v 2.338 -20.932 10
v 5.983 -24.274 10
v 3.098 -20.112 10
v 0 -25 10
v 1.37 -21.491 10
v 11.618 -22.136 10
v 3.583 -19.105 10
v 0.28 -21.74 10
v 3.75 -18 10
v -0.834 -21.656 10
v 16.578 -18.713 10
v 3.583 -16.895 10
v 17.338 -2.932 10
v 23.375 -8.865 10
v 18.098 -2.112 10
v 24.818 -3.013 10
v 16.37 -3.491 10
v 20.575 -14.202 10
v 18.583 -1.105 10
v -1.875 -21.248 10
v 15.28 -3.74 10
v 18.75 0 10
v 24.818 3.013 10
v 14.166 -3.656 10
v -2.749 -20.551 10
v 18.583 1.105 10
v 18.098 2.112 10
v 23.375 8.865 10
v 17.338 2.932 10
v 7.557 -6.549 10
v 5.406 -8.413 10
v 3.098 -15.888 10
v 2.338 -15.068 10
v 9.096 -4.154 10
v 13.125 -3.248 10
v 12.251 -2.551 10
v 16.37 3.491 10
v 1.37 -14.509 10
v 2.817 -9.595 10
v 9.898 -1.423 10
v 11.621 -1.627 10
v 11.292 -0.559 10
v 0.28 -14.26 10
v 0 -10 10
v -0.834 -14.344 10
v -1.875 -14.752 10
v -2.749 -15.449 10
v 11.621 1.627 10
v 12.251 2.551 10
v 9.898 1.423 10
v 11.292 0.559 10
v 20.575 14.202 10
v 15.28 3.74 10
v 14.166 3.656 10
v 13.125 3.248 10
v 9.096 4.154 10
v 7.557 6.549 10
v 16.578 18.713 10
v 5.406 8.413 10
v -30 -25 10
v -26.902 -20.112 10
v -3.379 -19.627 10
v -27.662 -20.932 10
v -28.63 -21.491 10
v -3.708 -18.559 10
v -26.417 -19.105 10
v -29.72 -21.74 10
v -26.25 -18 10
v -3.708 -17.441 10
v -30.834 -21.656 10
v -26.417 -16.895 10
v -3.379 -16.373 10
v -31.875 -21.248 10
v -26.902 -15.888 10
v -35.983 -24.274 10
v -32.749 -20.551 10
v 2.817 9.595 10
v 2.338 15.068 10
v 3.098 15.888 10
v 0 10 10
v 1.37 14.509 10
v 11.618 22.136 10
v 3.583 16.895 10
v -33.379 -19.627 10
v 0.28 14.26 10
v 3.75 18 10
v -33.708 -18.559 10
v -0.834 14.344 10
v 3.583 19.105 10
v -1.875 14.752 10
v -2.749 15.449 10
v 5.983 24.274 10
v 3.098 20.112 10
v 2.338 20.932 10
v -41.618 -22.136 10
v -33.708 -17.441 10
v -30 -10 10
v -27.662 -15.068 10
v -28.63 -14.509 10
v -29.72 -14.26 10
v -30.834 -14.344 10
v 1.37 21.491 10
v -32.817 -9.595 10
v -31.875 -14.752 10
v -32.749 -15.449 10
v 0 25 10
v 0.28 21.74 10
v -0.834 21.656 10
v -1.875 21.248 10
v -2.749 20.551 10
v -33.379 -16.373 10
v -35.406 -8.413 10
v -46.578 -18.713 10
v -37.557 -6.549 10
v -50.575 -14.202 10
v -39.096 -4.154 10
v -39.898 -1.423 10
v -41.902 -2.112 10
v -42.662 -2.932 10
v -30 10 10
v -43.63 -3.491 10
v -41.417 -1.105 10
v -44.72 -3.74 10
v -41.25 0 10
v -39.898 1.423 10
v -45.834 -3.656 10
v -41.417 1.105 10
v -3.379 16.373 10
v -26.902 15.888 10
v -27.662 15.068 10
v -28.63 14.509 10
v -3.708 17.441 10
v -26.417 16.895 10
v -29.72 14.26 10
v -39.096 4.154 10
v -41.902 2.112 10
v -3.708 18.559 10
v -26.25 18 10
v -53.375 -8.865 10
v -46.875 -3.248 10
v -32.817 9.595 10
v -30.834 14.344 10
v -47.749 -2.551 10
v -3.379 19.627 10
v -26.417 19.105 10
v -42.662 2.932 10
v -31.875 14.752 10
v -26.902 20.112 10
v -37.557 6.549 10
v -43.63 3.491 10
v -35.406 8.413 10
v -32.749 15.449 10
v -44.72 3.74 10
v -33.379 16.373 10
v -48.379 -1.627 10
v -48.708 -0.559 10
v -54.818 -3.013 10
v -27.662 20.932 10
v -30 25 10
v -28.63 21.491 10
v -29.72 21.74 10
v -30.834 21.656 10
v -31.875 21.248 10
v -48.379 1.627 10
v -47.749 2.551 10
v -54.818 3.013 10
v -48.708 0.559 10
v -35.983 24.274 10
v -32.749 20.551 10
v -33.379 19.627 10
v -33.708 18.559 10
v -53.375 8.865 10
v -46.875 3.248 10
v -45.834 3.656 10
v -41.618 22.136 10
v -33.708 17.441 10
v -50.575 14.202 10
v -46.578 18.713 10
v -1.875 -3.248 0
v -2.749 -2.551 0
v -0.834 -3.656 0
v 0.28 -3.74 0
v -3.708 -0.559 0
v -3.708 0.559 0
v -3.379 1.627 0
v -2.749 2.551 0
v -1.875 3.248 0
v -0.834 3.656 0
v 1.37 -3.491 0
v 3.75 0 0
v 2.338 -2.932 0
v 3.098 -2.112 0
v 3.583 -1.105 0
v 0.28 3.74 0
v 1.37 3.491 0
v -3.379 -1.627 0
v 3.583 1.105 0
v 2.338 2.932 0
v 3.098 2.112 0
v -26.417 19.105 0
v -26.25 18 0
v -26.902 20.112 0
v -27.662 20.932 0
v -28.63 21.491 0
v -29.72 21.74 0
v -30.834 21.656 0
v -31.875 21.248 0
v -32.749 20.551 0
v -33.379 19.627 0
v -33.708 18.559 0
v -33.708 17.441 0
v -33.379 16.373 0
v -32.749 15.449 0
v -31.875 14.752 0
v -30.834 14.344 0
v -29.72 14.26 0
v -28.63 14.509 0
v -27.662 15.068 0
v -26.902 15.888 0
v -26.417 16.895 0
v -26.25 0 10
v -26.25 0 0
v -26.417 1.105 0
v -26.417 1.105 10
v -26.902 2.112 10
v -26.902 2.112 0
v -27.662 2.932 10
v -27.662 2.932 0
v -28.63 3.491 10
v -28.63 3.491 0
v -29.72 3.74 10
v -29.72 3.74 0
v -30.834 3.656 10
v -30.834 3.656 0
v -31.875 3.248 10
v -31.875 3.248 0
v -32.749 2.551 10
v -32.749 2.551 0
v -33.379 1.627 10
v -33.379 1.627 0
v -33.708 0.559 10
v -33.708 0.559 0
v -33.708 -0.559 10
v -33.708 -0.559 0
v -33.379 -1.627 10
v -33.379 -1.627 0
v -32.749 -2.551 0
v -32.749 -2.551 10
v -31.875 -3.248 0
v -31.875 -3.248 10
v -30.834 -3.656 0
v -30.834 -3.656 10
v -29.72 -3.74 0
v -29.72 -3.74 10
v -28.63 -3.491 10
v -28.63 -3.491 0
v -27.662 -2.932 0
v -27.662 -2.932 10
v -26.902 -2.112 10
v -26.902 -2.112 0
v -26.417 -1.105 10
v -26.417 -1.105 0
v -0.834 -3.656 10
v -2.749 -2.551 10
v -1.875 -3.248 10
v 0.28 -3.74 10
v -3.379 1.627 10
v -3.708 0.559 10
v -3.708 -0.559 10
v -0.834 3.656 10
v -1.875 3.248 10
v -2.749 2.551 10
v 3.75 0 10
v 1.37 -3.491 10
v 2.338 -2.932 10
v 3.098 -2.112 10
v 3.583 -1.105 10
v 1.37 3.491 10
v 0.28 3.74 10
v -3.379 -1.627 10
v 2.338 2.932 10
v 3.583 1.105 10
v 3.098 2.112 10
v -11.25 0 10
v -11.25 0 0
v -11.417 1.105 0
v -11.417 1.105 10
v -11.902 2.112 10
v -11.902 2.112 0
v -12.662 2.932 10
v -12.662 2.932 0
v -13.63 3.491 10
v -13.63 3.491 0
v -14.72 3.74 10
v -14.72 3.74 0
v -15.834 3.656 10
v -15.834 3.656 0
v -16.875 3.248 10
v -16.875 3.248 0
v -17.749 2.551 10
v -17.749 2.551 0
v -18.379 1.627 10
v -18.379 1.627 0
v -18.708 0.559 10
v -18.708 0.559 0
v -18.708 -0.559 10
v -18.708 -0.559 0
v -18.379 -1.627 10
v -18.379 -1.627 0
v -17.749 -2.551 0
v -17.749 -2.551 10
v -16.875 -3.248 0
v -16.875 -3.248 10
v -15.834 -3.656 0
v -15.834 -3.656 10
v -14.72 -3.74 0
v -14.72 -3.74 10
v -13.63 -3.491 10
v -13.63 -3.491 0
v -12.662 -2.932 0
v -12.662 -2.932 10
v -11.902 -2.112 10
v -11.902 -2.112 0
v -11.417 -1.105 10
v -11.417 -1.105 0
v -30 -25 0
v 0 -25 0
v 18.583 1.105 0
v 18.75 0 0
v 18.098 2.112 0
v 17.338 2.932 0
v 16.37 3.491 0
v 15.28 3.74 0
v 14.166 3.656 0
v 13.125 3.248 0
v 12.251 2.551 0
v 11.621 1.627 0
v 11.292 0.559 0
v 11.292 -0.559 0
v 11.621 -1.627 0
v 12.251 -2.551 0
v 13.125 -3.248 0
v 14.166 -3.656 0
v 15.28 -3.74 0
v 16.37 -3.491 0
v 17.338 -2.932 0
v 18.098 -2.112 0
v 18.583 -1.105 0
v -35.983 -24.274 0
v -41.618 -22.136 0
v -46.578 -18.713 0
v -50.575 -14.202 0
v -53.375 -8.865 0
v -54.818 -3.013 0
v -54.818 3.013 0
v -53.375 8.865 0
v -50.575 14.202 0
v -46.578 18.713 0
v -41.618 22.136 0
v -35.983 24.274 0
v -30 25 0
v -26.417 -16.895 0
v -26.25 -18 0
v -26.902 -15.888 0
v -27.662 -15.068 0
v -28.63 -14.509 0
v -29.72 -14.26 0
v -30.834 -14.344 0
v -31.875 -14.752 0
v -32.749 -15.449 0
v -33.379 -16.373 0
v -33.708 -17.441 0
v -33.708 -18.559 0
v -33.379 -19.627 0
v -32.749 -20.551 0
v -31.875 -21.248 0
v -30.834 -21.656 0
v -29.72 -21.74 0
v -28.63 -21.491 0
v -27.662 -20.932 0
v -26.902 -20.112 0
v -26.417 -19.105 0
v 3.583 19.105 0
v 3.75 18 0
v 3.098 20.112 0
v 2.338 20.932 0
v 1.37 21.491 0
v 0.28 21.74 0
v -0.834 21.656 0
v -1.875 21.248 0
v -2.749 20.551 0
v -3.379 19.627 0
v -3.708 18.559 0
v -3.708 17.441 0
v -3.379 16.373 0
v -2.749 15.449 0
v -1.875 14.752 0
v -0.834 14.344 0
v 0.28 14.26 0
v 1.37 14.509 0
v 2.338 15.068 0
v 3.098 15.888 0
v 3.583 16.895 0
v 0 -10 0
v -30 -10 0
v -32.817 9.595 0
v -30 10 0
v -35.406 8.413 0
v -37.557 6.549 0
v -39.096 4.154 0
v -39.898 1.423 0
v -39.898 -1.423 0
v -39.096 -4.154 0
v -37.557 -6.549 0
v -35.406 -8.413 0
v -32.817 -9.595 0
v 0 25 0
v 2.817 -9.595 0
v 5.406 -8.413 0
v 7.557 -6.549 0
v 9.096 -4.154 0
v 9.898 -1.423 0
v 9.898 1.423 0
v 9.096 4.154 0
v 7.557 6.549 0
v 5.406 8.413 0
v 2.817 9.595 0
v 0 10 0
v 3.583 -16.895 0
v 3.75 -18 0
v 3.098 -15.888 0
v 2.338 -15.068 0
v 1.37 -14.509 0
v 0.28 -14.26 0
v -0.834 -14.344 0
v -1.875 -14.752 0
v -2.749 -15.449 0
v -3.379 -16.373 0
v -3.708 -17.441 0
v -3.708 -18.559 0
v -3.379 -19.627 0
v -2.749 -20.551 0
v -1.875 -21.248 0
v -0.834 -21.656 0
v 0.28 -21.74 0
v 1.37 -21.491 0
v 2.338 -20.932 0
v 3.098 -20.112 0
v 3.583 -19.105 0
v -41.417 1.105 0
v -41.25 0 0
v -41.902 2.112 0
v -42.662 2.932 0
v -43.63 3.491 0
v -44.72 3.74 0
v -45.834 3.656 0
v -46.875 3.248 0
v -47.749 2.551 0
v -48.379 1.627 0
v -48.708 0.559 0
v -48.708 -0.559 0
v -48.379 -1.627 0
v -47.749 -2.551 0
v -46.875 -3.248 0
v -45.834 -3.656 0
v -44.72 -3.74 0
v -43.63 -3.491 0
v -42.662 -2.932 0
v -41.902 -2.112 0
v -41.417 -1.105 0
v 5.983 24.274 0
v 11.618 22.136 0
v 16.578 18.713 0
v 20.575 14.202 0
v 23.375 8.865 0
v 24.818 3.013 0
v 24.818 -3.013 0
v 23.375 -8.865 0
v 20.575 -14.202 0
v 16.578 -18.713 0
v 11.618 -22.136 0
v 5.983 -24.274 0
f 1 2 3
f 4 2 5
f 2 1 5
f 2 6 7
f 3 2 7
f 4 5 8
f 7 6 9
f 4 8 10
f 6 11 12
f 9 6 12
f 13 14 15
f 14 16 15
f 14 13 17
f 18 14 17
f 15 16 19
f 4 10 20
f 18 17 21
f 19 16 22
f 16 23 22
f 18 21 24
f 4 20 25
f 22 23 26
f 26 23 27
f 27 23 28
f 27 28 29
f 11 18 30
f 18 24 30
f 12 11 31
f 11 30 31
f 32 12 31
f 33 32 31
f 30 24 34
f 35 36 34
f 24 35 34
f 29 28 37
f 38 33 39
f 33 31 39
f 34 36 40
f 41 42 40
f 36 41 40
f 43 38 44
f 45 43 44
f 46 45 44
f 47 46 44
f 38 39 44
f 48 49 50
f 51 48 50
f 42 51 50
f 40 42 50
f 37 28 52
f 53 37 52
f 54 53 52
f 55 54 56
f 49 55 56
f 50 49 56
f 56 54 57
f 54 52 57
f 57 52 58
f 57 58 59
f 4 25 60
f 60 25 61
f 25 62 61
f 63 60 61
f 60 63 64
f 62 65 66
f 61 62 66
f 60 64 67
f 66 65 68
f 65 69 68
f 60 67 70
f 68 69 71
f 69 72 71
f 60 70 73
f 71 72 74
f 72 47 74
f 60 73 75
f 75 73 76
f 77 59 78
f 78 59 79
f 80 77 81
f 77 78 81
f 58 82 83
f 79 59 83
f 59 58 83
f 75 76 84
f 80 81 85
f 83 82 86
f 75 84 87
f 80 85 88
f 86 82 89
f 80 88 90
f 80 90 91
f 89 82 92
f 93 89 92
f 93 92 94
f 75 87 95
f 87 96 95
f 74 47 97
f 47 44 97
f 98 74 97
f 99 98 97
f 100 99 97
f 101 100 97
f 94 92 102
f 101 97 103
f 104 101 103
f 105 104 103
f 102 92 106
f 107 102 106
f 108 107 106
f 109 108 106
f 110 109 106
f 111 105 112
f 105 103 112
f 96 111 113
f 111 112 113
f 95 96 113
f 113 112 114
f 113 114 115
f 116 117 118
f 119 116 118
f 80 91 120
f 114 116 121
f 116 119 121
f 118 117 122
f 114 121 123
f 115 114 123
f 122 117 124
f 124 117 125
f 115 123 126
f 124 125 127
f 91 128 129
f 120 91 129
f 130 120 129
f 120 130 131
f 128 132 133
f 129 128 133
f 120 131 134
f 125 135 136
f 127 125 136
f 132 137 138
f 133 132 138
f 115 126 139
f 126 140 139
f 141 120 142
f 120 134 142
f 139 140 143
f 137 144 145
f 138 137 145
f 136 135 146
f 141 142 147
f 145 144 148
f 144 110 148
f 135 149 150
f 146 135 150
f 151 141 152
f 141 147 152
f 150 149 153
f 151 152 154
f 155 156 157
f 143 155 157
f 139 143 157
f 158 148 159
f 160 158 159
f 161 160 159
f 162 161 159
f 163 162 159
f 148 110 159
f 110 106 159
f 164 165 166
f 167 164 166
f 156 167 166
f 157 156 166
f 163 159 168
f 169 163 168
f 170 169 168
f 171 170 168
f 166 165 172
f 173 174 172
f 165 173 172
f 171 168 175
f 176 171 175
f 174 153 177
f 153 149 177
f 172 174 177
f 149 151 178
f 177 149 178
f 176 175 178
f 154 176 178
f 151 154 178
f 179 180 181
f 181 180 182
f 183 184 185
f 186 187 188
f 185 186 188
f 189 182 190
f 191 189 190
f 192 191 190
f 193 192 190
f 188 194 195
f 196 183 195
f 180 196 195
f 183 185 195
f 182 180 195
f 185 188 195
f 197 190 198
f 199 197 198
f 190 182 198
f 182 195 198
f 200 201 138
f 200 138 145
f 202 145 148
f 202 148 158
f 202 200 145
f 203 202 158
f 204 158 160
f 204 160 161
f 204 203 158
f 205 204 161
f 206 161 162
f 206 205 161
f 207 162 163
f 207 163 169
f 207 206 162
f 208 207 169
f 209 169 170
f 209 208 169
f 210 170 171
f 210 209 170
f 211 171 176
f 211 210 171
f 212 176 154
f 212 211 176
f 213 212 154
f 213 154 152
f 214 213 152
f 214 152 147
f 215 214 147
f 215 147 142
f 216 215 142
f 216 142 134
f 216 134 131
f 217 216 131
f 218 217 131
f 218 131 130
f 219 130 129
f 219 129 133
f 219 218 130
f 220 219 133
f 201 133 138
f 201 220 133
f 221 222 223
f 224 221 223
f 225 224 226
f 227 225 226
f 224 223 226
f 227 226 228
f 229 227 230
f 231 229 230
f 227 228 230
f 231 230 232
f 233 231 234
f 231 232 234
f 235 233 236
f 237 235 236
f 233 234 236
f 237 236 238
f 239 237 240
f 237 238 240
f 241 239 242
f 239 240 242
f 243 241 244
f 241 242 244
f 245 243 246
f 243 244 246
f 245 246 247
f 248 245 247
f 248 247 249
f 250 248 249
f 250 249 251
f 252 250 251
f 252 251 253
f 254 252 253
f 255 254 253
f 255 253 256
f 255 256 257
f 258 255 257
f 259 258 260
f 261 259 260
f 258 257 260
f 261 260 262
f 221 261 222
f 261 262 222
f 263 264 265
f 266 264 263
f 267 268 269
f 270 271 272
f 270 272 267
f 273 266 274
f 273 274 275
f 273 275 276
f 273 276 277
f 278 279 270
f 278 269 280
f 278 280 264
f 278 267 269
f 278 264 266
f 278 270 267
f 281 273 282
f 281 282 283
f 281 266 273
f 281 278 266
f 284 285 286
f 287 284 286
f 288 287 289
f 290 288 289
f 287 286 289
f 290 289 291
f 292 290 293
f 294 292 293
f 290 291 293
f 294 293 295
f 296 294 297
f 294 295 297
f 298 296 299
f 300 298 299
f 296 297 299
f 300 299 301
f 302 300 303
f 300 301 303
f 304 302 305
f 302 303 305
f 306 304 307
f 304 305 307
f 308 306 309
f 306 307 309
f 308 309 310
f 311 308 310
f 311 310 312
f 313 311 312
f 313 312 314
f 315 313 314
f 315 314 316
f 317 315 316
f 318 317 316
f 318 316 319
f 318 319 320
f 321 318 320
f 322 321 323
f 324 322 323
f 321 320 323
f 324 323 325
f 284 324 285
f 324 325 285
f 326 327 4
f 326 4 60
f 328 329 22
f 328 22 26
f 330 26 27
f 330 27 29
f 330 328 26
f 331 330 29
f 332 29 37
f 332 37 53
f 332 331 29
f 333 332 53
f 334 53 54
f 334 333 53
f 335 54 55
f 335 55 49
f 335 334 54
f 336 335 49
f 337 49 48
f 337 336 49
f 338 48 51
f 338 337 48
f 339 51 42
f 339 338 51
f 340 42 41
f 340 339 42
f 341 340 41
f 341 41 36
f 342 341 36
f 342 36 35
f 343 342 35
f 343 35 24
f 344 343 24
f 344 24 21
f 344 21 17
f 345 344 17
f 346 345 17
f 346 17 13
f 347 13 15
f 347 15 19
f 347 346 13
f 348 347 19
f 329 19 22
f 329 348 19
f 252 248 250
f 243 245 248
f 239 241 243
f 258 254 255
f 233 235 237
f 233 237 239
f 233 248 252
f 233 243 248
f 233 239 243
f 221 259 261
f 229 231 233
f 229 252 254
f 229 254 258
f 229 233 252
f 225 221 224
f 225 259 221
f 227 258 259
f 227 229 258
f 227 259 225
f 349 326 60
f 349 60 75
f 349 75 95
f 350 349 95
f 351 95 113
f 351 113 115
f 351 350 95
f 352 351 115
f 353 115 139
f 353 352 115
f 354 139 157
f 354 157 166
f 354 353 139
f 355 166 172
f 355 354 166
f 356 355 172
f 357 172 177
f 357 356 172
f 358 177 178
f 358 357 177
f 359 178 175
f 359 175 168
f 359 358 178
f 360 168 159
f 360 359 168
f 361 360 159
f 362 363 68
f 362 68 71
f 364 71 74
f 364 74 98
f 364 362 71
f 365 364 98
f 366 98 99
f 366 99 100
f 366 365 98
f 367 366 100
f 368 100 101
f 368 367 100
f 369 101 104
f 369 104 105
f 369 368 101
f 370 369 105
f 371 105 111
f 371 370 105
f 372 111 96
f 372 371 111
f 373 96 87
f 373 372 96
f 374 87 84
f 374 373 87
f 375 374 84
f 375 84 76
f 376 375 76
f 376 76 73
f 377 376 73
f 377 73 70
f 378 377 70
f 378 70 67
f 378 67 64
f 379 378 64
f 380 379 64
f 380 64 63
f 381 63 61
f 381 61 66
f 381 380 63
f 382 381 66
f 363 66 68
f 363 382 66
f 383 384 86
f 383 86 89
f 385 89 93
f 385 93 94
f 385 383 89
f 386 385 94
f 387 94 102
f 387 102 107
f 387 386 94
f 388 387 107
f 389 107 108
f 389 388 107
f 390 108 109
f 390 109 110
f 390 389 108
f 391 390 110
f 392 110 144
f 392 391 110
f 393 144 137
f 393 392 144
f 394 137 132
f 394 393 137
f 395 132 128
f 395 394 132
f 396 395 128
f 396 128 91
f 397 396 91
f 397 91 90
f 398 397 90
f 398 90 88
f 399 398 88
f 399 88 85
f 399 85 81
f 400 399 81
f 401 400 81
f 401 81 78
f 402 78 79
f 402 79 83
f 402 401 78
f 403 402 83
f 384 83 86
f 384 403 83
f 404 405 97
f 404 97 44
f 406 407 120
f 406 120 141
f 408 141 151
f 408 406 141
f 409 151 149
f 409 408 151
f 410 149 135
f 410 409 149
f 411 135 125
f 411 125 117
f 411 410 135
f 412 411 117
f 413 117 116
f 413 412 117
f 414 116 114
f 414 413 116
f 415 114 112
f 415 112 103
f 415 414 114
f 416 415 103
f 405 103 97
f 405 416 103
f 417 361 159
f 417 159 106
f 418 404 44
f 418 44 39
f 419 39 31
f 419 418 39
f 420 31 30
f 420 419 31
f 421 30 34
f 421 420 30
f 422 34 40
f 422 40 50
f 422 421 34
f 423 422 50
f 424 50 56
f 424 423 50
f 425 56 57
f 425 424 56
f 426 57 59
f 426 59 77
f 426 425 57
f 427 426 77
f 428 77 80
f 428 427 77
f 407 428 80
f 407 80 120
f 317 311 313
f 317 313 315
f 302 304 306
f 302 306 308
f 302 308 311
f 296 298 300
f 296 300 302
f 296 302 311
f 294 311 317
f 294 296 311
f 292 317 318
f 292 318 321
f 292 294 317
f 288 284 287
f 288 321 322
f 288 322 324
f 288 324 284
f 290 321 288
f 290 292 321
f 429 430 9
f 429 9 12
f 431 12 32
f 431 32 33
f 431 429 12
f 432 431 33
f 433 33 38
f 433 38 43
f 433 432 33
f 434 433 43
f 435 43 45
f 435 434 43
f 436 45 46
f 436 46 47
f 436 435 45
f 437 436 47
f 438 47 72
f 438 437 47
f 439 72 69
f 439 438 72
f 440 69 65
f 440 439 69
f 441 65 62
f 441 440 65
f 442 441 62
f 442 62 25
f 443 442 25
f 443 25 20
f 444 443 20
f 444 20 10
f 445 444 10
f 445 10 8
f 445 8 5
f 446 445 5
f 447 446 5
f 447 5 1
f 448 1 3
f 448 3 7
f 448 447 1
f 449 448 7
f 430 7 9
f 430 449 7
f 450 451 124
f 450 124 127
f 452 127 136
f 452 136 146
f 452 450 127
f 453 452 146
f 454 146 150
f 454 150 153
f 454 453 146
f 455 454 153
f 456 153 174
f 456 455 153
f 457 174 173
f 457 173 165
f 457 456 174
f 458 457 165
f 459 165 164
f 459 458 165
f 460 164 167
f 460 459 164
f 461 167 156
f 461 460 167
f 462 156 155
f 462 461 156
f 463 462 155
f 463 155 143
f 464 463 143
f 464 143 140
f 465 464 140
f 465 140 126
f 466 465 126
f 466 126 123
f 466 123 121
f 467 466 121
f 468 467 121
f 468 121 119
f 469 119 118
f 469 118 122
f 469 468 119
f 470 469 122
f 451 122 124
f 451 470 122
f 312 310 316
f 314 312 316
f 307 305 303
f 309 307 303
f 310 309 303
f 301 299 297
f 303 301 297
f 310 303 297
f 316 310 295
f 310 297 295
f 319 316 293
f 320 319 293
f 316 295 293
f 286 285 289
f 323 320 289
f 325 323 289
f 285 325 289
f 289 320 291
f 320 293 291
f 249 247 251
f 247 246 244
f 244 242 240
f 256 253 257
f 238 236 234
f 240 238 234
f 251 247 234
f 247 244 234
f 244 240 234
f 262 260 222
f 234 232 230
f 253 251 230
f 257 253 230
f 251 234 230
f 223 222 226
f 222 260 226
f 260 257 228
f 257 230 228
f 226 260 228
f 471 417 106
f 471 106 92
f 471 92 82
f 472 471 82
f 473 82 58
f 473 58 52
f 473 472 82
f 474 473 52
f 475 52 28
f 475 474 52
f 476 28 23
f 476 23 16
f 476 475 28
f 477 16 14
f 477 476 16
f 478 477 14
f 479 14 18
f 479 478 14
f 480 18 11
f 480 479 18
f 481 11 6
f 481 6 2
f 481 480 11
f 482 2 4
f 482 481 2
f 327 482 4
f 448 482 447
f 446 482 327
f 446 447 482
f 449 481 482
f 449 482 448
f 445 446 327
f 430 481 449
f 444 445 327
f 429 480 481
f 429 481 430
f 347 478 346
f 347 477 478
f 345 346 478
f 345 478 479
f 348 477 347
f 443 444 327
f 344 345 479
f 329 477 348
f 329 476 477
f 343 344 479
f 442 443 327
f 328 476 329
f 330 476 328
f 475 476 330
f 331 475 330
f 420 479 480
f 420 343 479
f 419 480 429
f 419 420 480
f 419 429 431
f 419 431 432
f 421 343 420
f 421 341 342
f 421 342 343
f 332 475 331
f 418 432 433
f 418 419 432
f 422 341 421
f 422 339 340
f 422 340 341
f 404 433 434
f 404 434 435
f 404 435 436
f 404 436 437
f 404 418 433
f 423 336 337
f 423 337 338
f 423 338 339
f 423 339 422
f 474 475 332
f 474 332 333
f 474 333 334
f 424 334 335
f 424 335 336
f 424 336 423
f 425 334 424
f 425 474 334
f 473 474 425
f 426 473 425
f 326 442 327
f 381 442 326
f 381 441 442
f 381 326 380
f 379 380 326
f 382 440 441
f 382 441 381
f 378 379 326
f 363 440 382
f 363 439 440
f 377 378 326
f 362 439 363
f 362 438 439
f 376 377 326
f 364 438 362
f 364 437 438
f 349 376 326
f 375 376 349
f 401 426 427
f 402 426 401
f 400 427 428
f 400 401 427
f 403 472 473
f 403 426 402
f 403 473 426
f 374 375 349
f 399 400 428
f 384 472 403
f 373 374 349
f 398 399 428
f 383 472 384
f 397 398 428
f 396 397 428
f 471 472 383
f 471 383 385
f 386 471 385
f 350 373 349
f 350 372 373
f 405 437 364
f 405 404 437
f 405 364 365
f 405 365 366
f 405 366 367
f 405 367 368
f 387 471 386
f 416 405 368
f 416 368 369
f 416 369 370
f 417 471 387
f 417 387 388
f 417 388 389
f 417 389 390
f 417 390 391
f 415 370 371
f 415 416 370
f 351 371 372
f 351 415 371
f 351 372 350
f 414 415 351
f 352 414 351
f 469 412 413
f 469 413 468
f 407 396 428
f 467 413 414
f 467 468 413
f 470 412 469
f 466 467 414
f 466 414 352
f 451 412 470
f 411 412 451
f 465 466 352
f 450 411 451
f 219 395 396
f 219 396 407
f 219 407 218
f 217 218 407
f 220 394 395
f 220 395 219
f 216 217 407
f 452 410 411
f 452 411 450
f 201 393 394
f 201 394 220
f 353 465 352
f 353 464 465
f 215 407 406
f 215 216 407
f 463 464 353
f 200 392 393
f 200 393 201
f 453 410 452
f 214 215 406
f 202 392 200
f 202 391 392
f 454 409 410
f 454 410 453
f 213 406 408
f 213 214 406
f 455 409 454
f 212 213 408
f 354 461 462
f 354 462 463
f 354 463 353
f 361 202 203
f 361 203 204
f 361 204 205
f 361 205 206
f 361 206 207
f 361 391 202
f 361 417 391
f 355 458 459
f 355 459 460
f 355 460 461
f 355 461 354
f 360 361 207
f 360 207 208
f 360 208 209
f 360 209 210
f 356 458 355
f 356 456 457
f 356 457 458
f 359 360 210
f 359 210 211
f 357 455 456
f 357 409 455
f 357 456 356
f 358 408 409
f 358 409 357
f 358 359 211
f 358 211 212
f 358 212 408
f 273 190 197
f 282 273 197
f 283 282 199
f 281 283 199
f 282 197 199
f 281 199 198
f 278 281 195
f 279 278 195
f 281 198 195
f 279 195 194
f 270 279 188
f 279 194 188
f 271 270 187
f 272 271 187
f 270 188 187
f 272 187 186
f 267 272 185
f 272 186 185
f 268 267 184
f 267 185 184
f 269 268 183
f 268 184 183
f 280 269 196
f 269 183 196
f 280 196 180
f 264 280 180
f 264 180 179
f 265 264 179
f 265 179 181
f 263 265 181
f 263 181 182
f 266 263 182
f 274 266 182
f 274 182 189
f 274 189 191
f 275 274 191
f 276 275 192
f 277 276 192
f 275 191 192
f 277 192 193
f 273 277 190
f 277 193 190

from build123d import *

# Parameters (mm, degrees)
CROQUIS1_R                = 3.75
SALIENTE_EXTRUIR1_DEPTH   = 10
SALIENTE_EXTRUIR1_2_DEPTH = 10
SALIENTE_EXTRUIR1_3_DEPTH = 10
SALIENTE_EXTRUIR1_4_DEPTH = 10


with BuildPart() as part:
    # Croquis1 → Saliente-Extruir1 (new body)
    with BuildSketch(Plane.XY):
        with BuildLine():
            Line((0, -25), (-30, -25))
            ThreePointArc((-30, -25), (-55, 0), (-30, 25))
            Line((-30, 25), (0, 25))
            ThreePointArc((0, 25), (25, 0), (0, -25))
        make_face()
        with Locations((0, -18)):
            Circle(CROQUIS1_R, mode=Mode.SUBTRACT)
        with Locations((-30, -18)):
            Circle(CROQUIS1_R, mode=Mode.SUBTRACT)
        with Locations((0, 18)):
            Circle(CROQUIS1_R, mode=Mode.SUBTRACT)
        with Locations((-30, 18)):
            Circle(CROQUIS1_R, mode=Mode.SUBTRACT)
        with Locations((15, 0)):
            Circle(CROQUIS1_R, mode=Mode.SUBTRACT)
        with Locations((-45, 0)):
            Circle(CROQUIS1_R, mode=Mode.SUBTRACT)
        with BuildLine():
            ThreePointArc((-30, 10), (-40, 0), (-30, -10))
            Line((-30, -10), (0, -10))
            ThreePointArc((0, -10), (10, 0), (0, 10))
            Line((0, 10), (-30, 10))
        make_face(mode=Mode.SUBTRACT)
    extrude(amount=SALIENTE_EXTRUIR1_DEPTH)


with BuildPart() as body_2:
    # Croquis1 → Saliente-Extruir1 2 (new body)
    with BuildSketch(Plane.XY):
        with Locations((-30, 0)):
            Circle(CROQUIS1_R)
    extrude(amount=SALIENTE_EXTRUIR1_2_DEPTH)


with BuildPart() as body_3:
    # Croquis1 → Saliente-Extruir1 3 (new body)
    with BuildSketch(Plane.XY):
        Circle(CROQUIS1_R)
    extrude(amount=SALIENTE_EXTRUIR1_3_DEPTH)


with BuildPart() as body_4:
    # Croquis1 → Saliente-Extruir1 4 (new body)
    with BuildSketch(Plane.XY):
        with Locations((-15, 0)):
            Circle(CROQUIS1_R)
    extrude(amount=SALIENTE_EXTRUIR1_4_DEPTH)


solid = Compound([part.part, body_2.part, body_3.part, body_4.part])
